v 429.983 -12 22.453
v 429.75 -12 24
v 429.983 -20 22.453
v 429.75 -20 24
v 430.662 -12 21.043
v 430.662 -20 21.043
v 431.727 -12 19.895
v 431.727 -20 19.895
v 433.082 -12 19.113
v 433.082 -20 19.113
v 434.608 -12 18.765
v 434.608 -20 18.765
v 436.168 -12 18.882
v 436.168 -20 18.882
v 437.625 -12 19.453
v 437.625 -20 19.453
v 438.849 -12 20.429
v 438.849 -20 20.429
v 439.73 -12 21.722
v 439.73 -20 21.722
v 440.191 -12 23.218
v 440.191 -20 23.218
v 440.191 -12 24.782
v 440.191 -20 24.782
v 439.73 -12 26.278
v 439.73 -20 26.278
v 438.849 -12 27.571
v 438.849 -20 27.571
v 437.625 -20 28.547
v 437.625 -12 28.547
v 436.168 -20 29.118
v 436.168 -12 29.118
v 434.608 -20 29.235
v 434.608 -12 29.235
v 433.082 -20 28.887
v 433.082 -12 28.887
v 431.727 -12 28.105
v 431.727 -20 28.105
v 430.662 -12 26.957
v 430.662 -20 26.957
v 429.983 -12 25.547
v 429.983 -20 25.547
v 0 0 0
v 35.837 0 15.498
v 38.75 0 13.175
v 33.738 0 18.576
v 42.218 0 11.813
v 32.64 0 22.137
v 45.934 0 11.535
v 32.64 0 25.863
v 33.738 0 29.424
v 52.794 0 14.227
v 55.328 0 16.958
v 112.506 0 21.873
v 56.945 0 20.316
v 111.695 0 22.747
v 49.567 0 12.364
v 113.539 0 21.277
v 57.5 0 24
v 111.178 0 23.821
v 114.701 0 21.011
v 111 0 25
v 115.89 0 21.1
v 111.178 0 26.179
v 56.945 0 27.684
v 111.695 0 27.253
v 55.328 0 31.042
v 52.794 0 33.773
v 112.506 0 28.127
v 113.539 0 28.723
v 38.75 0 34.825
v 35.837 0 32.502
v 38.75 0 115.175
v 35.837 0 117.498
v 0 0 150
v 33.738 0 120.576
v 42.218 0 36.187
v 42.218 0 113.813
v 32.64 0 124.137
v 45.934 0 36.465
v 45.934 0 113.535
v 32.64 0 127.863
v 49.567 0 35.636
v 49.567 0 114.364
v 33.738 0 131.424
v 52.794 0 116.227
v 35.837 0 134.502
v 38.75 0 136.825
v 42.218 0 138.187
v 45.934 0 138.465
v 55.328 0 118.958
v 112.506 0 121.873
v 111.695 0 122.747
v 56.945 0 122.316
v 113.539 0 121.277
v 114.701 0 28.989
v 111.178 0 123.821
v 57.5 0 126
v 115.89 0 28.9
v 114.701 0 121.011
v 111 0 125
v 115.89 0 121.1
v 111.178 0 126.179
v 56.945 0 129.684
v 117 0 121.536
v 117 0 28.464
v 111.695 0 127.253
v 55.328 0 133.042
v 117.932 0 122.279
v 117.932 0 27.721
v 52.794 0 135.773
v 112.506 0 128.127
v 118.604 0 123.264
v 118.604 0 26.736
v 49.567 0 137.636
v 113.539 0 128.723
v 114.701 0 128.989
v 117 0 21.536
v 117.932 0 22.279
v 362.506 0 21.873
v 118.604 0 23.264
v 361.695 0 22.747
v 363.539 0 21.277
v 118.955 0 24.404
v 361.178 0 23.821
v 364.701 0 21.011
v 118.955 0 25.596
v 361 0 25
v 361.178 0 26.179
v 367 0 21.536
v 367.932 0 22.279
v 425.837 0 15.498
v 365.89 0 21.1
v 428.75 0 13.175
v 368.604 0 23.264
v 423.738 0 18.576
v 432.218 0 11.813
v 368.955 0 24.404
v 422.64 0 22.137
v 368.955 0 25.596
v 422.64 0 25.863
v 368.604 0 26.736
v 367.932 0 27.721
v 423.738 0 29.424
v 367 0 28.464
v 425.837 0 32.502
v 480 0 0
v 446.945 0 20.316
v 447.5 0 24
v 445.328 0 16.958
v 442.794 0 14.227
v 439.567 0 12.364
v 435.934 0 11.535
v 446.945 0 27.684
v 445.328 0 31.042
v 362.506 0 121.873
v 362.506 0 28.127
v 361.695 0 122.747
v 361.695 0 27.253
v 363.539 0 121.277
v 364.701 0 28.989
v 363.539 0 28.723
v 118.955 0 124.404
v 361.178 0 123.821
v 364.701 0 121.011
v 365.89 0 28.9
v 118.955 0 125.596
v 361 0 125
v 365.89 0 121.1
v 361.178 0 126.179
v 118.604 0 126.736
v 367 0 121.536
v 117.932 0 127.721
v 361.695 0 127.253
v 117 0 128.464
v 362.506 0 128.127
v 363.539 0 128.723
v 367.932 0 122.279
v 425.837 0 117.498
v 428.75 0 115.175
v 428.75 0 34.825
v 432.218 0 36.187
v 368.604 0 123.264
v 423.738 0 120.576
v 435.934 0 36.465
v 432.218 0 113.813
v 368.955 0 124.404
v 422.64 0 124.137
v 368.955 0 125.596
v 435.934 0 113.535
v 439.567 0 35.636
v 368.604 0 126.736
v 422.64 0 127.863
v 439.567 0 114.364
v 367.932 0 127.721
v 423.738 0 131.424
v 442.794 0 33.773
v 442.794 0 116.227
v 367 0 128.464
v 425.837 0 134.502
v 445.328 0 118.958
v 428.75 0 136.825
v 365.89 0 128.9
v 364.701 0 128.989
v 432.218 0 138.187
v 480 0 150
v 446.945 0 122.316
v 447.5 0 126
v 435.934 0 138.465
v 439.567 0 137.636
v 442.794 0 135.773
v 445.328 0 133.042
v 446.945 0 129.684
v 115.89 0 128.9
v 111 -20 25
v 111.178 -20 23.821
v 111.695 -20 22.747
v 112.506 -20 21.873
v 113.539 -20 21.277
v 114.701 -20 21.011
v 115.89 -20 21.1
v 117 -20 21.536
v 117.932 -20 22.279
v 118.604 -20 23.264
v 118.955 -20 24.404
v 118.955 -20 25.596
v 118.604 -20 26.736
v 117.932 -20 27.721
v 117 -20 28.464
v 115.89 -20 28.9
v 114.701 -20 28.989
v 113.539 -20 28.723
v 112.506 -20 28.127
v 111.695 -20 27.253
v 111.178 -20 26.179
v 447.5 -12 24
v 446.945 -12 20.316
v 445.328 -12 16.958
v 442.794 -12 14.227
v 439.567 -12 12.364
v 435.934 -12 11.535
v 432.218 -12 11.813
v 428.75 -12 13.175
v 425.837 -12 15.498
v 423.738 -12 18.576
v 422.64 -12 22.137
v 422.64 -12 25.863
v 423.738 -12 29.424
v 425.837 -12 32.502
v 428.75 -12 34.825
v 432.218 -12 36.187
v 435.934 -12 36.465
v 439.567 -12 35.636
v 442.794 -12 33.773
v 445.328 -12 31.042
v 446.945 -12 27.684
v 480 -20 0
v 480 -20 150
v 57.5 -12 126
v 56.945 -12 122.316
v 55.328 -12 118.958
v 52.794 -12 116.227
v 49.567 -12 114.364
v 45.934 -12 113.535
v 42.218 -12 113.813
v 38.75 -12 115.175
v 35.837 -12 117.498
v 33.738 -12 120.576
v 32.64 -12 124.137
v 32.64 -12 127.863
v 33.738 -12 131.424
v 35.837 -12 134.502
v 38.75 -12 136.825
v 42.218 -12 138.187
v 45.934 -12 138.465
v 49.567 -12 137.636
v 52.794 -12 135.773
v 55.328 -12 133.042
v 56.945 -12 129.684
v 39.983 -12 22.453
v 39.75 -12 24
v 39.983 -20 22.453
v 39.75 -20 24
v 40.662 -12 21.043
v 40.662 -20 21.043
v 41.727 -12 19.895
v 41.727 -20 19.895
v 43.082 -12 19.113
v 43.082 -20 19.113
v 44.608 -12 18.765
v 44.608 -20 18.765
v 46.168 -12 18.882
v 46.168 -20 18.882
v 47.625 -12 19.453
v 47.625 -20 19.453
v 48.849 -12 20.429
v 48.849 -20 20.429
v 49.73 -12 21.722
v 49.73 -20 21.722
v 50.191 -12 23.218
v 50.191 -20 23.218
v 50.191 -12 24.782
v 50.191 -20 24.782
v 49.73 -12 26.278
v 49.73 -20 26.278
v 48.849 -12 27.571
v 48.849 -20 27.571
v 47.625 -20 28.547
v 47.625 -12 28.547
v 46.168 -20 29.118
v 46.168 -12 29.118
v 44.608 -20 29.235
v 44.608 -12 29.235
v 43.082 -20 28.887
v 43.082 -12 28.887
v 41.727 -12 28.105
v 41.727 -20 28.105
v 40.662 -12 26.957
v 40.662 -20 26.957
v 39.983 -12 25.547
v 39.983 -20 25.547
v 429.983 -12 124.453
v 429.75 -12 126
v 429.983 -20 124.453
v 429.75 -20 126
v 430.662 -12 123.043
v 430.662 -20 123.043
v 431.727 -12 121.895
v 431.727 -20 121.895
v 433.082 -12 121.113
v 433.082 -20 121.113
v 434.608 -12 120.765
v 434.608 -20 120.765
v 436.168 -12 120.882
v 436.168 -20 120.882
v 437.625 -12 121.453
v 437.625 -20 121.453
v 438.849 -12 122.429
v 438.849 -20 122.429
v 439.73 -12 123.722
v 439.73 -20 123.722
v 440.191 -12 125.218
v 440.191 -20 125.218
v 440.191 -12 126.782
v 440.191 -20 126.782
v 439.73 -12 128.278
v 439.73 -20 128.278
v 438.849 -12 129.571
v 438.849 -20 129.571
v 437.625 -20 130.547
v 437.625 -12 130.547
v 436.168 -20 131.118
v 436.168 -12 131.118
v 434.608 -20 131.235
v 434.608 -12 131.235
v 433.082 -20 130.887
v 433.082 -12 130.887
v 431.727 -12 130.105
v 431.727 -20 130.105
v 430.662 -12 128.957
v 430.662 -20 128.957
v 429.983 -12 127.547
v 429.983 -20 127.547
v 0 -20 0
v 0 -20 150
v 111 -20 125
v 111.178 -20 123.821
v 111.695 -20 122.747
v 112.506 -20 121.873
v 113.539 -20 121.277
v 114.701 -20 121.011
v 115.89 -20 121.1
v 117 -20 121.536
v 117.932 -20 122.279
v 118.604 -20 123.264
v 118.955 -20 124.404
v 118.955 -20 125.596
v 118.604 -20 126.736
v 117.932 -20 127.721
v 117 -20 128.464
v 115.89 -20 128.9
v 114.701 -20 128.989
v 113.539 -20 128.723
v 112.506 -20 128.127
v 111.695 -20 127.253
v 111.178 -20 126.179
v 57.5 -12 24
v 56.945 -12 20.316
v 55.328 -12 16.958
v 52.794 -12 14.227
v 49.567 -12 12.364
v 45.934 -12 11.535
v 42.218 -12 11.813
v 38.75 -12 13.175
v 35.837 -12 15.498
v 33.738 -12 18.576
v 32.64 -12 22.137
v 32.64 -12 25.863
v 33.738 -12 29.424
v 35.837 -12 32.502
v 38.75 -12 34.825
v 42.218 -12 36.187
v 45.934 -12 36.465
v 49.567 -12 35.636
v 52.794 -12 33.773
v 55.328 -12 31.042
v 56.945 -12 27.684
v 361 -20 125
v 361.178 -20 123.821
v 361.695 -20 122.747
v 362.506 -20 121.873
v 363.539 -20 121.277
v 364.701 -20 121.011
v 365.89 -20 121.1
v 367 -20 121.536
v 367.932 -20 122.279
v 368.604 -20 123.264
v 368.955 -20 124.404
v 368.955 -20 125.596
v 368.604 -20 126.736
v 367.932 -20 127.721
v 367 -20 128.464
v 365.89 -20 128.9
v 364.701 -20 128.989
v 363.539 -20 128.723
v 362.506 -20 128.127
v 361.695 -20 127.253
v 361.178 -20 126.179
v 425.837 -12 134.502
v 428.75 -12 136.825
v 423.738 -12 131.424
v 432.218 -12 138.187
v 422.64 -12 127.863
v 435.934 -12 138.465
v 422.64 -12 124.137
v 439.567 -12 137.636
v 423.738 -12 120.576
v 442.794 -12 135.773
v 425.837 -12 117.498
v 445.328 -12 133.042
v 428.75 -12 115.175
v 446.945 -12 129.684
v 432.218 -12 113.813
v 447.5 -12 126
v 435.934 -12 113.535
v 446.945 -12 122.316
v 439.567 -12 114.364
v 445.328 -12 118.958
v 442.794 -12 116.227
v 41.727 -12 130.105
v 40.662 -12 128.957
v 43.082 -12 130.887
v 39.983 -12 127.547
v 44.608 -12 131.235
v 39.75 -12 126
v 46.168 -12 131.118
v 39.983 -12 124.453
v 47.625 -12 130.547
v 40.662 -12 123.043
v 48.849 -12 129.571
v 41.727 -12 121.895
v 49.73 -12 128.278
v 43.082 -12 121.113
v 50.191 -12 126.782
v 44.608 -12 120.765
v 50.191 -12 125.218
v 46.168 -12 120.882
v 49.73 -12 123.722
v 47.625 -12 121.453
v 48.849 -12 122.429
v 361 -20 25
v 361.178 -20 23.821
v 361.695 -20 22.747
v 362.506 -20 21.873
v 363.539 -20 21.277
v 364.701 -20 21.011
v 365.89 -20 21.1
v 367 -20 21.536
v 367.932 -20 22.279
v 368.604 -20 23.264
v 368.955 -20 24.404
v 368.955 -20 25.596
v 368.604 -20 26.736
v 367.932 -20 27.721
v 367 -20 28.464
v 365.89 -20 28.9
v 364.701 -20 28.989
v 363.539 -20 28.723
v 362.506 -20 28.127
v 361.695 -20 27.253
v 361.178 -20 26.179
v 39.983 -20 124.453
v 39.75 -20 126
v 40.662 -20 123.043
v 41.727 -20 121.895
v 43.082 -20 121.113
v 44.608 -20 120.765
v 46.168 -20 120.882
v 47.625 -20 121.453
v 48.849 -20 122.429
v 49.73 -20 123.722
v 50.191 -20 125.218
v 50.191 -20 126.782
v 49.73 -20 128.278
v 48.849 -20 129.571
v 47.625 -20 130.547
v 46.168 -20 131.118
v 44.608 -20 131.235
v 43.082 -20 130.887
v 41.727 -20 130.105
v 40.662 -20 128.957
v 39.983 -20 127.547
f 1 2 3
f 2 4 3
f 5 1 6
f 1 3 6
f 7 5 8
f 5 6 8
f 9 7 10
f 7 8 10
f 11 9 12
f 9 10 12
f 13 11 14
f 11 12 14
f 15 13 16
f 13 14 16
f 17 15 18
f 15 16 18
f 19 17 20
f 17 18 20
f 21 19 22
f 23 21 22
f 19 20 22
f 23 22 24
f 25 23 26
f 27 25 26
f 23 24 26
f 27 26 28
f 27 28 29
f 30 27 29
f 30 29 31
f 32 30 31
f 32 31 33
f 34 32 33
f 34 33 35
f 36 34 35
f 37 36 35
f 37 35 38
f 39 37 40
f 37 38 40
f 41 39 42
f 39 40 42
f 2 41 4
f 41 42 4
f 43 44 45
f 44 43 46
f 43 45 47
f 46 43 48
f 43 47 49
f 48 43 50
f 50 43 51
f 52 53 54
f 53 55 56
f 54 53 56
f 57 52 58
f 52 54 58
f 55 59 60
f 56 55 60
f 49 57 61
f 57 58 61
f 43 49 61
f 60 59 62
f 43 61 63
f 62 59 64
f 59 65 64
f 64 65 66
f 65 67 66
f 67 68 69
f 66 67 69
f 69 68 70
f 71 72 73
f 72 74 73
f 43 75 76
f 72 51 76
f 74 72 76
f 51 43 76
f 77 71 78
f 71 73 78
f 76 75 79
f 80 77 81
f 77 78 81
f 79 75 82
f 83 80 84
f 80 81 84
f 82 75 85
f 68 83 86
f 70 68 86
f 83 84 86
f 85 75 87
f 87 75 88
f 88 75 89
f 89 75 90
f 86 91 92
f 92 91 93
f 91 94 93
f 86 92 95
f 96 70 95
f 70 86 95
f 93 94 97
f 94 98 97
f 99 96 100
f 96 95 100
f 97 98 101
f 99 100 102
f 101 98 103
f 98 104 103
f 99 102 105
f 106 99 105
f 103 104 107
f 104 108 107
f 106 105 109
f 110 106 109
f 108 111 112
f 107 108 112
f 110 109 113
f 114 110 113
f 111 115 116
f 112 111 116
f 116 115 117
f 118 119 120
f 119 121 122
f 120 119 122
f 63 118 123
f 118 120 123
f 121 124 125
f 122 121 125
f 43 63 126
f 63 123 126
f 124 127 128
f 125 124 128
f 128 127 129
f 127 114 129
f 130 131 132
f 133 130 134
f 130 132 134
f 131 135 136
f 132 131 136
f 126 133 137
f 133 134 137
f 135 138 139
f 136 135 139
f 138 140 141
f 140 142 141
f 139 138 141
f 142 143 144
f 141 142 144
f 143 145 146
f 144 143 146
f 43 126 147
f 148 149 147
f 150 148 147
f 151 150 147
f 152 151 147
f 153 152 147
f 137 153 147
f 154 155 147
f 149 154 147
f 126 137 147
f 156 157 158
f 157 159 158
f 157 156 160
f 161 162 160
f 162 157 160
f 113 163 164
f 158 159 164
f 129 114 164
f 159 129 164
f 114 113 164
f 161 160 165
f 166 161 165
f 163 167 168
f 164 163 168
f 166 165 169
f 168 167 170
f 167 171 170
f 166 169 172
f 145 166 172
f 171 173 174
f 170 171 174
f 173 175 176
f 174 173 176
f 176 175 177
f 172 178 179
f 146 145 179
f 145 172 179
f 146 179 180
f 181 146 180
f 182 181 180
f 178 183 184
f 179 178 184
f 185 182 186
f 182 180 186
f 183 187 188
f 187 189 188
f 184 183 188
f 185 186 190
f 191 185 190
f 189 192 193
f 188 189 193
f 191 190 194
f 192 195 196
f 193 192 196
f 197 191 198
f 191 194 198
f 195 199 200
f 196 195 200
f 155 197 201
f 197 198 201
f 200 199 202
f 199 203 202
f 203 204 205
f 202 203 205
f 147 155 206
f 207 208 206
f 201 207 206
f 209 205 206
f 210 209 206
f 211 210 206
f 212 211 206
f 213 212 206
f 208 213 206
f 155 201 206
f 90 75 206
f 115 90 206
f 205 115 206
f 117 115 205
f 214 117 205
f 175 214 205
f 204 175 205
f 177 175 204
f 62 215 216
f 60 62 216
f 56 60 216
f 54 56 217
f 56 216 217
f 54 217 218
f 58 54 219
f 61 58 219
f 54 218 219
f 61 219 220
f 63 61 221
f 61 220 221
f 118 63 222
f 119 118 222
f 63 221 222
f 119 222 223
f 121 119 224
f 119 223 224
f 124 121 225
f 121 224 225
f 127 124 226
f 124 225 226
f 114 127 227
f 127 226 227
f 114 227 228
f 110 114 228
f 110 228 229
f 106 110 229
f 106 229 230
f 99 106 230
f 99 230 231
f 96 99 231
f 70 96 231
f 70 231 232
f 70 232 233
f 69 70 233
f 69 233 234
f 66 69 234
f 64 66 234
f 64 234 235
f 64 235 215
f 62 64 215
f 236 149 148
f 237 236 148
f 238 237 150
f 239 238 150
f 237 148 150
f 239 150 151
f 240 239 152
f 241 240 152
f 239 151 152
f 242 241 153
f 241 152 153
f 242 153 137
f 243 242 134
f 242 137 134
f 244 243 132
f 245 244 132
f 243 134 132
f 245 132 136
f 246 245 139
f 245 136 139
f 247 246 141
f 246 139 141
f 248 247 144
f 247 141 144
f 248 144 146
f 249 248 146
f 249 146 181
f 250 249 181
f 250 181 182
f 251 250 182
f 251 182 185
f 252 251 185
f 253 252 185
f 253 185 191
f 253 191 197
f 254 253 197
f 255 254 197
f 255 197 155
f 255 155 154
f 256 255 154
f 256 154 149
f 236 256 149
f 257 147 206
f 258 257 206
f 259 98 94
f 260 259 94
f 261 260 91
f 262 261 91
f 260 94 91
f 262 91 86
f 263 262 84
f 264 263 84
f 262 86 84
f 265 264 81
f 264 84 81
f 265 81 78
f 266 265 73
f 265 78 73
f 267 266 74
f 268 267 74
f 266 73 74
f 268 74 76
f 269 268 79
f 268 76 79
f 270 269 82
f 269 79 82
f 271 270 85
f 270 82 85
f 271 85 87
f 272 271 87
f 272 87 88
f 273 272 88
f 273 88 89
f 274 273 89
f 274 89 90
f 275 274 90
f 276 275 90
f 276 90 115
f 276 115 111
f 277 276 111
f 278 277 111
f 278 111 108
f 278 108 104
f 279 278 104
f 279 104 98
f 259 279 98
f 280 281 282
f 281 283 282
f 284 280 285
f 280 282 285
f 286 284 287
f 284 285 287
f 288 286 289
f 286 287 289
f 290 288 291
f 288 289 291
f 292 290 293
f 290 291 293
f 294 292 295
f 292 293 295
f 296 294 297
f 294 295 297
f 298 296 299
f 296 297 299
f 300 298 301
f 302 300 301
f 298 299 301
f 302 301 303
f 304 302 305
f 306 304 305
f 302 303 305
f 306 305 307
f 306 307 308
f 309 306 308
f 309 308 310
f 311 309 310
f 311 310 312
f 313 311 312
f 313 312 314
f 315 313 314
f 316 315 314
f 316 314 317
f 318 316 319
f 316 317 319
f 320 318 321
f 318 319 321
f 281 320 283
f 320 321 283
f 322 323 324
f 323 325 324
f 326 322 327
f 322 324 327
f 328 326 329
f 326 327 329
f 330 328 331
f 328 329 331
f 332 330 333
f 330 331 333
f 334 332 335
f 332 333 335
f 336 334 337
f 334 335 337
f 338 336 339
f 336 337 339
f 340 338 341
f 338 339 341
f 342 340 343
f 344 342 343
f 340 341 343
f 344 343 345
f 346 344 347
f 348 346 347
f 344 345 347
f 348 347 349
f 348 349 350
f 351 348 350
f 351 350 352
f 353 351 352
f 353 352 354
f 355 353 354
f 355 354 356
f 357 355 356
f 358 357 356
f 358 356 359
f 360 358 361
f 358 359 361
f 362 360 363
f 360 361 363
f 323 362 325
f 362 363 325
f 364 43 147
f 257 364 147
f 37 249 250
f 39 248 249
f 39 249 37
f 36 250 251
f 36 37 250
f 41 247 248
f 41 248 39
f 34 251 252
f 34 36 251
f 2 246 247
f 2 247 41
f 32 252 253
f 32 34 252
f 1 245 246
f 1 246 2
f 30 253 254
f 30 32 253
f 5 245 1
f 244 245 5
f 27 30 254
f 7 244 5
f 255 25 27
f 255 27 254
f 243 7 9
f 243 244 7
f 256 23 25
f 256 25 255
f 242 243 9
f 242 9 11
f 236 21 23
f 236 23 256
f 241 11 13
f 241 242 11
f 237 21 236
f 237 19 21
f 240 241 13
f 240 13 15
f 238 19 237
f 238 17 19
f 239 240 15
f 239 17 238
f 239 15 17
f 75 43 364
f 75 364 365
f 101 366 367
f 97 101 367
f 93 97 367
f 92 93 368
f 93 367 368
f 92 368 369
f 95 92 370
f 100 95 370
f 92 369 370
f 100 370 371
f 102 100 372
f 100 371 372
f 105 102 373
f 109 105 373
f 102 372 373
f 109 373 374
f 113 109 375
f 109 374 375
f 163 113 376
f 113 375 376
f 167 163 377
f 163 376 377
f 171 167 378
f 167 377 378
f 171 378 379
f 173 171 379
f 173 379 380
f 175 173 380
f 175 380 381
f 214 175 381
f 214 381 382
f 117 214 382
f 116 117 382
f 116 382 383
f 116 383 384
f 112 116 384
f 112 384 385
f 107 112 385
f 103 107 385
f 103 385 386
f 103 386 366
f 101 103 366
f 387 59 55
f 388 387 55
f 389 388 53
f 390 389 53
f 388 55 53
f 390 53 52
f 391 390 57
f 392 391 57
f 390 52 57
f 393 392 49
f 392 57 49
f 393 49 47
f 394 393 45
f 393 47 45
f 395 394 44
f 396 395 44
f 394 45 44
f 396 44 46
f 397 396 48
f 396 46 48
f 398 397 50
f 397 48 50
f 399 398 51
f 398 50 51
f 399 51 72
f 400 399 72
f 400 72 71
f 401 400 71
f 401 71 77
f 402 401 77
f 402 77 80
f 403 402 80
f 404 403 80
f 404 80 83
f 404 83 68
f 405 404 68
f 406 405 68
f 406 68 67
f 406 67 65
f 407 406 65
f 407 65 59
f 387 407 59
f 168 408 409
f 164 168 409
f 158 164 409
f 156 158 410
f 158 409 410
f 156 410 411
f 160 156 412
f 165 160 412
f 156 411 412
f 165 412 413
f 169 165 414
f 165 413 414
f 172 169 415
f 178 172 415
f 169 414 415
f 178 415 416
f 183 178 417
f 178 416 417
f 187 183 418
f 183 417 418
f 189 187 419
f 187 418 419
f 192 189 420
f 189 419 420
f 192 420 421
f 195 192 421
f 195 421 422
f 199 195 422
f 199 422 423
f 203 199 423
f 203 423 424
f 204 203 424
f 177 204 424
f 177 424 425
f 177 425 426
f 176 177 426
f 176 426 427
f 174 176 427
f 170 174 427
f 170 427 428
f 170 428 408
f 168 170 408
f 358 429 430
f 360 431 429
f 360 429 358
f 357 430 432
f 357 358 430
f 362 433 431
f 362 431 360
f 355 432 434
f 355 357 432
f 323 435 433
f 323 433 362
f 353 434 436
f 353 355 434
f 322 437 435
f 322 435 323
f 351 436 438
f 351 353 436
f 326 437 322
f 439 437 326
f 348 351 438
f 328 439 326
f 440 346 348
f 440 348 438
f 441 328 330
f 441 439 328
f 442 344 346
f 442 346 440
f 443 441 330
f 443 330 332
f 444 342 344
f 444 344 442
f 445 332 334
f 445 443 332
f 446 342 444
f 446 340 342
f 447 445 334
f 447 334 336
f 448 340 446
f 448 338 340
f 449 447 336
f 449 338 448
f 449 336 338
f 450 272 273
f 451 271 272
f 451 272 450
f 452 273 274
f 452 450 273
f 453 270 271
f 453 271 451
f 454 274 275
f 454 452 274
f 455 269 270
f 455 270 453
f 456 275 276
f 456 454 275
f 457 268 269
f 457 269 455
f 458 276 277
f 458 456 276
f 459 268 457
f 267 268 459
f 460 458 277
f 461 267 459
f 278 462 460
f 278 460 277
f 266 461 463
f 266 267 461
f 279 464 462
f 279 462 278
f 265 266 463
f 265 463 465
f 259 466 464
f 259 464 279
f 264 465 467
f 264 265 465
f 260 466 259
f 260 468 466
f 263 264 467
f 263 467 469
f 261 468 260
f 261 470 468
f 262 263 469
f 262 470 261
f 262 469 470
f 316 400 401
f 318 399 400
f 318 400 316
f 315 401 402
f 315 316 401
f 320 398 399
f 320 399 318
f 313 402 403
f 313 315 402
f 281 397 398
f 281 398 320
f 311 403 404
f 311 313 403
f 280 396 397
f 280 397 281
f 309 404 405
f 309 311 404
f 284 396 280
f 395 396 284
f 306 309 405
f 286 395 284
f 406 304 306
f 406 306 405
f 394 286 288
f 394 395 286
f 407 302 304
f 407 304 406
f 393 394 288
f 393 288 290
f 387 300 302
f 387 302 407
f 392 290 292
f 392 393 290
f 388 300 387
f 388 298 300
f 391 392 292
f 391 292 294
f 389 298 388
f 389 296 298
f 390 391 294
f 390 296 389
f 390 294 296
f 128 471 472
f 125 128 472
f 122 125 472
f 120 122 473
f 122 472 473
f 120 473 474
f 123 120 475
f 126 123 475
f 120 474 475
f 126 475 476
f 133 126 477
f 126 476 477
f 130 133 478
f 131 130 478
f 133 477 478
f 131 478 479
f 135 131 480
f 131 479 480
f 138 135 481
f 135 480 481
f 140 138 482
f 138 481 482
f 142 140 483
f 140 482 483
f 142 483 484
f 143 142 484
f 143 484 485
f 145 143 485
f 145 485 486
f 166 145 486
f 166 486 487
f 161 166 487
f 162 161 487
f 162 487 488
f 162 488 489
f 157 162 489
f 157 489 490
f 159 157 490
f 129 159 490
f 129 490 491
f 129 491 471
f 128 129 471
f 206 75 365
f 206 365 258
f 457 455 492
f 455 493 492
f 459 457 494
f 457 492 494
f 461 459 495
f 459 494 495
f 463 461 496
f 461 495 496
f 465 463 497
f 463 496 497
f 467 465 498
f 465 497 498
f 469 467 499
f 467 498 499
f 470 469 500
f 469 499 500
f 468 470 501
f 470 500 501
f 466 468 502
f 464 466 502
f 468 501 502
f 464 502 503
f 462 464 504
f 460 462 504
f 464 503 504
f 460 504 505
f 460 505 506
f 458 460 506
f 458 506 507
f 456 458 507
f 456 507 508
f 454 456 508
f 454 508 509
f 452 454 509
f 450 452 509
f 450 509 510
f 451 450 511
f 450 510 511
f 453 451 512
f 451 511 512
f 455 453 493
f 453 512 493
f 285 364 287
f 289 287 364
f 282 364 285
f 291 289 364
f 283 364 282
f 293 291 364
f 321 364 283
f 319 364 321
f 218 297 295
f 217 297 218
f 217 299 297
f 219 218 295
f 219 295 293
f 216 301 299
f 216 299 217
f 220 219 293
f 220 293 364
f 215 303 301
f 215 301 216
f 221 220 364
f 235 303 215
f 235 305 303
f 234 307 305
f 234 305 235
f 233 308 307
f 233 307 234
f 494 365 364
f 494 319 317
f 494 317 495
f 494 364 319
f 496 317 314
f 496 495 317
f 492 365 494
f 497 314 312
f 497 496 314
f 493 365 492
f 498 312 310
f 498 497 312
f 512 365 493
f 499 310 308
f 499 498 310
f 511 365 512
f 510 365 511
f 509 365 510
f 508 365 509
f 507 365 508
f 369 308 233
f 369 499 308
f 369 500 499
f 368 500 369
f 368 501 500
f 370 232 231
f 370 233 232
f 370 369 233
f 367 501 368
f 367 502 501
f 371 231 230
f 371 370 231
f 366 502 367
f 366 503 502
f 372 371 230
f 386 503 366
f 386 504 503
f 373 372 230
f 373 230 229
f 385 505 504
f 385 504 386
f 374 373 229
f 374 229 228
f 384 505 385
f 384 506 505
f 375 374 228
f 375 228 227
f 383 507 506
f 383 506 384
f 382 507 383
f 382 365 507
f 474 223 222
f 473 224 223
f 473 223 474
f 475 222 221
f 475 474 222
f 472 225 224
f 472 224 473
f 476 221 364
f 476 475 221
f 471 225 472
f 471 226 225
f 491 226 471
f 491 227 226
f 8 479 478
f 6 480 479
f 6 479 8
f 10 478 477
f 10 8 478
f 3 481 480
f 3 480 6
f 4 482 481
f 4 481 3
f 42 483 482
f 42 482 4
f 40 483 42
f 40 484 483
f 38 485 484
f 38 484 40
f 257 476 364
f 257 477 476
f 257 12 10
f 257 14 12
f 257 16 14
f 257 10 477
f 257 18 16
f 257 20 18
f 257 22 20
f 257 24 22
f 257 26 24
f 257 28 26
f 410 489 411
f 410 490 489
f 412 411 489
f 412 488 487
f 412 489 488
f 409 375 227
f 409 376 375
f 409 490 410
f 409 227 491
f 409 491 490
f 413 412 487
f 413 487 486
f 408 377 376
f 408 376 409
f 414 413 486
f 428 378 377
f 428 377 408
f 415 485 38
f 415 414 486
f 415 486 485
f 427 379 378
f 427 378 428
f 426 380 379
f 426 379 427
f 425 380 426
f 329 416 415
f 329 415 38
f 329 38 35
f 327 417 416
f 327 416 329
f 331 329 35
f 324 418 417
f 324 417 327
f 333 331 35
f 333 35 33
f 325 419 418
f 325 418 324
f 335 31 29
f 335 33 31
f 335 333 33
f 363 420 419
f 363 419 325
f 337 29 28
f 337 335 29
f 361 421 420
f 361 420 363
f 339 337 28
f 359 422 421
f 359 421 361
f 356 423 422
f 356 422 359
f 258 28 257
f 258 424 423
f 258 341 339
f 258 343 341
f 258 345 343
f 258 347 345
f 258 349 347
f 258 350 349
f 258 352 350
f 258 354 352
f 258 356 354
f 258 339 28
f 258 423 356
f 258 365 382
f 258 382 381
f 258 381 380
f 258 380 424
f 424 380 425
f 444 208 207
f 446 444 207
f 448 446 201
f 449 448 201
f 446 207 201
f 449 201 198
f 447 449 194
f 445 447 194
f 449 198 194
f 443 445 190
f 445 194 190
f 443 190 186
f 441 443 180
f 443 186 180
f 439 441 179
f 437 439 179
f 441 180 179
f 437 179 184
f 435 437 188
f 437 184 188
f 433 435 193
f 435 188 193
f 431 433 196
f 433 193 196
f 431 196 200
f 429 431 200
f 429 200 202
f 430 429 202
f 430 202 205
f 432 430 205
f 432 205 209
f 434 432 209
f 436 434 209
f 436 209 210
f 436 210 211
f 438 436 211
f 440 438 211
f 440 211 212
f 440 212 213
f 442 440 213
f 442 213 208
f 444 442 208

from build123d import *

# Parameters (mm, degrees)
F0_W           = 480
F0_H           = 150
F1_DEPTH       = 20
F2_D           = 10.5
F2_DEPTH       = 35
F2_CBORE_D     = 25
F2_CBORE_DEPTH = 12
F2_TIP         = 3.1545182499
F3_D           = 8
F3_DEPTH       = 35
F3_TIP         = 2.4034424761


with BuildPart() as f1:
    # F0 (on Front) → F1 (new body)
    with BuildSketch(Plane.XZ):
        with Locations((240, 75)):
            Rectangle(F0_W, F0_H)
    extrude(amount=F1_DEPTH)

    # F2
    with Locations(Plane(origin=(0, 0, 0), x_dir=(1, 0, 0), z_dir=(0, 1, 0))):
        with Locations((435, -126), (435, -24), (45, -126), (45, -24)):
            CounterBoreHole(F2_D / 2, F2_CBORE_D / 2, F2_CBORE_DEPTH, depth=F2_DEPTH)
            with Locations((0, 0, -(F2_DEPTH + F2_TIP / 2))):  # 118° drill point
                Cone(0, F2_D / 2, F2_TIP, mode=Mode.SUBTRACT)

    # F3
    with Locations(Plane(origin=(0, 0, 0), x_dir=(1, 0, 0), z_dir=(0, 1, 0))):
        with Locations((115, -125), (115, -25), (365, -25), (365, -125)):
            Hole(F3_D / 2, depth=F3_DEPTH)
            with Locations((0, 0, -(F3_DEPTH + F3_TIP / 2))):  # 118° drill point
                Cone(0, F3_D / 2, F3_TIP, mode=Mode.SUBTRACT)


solid = f1.part
